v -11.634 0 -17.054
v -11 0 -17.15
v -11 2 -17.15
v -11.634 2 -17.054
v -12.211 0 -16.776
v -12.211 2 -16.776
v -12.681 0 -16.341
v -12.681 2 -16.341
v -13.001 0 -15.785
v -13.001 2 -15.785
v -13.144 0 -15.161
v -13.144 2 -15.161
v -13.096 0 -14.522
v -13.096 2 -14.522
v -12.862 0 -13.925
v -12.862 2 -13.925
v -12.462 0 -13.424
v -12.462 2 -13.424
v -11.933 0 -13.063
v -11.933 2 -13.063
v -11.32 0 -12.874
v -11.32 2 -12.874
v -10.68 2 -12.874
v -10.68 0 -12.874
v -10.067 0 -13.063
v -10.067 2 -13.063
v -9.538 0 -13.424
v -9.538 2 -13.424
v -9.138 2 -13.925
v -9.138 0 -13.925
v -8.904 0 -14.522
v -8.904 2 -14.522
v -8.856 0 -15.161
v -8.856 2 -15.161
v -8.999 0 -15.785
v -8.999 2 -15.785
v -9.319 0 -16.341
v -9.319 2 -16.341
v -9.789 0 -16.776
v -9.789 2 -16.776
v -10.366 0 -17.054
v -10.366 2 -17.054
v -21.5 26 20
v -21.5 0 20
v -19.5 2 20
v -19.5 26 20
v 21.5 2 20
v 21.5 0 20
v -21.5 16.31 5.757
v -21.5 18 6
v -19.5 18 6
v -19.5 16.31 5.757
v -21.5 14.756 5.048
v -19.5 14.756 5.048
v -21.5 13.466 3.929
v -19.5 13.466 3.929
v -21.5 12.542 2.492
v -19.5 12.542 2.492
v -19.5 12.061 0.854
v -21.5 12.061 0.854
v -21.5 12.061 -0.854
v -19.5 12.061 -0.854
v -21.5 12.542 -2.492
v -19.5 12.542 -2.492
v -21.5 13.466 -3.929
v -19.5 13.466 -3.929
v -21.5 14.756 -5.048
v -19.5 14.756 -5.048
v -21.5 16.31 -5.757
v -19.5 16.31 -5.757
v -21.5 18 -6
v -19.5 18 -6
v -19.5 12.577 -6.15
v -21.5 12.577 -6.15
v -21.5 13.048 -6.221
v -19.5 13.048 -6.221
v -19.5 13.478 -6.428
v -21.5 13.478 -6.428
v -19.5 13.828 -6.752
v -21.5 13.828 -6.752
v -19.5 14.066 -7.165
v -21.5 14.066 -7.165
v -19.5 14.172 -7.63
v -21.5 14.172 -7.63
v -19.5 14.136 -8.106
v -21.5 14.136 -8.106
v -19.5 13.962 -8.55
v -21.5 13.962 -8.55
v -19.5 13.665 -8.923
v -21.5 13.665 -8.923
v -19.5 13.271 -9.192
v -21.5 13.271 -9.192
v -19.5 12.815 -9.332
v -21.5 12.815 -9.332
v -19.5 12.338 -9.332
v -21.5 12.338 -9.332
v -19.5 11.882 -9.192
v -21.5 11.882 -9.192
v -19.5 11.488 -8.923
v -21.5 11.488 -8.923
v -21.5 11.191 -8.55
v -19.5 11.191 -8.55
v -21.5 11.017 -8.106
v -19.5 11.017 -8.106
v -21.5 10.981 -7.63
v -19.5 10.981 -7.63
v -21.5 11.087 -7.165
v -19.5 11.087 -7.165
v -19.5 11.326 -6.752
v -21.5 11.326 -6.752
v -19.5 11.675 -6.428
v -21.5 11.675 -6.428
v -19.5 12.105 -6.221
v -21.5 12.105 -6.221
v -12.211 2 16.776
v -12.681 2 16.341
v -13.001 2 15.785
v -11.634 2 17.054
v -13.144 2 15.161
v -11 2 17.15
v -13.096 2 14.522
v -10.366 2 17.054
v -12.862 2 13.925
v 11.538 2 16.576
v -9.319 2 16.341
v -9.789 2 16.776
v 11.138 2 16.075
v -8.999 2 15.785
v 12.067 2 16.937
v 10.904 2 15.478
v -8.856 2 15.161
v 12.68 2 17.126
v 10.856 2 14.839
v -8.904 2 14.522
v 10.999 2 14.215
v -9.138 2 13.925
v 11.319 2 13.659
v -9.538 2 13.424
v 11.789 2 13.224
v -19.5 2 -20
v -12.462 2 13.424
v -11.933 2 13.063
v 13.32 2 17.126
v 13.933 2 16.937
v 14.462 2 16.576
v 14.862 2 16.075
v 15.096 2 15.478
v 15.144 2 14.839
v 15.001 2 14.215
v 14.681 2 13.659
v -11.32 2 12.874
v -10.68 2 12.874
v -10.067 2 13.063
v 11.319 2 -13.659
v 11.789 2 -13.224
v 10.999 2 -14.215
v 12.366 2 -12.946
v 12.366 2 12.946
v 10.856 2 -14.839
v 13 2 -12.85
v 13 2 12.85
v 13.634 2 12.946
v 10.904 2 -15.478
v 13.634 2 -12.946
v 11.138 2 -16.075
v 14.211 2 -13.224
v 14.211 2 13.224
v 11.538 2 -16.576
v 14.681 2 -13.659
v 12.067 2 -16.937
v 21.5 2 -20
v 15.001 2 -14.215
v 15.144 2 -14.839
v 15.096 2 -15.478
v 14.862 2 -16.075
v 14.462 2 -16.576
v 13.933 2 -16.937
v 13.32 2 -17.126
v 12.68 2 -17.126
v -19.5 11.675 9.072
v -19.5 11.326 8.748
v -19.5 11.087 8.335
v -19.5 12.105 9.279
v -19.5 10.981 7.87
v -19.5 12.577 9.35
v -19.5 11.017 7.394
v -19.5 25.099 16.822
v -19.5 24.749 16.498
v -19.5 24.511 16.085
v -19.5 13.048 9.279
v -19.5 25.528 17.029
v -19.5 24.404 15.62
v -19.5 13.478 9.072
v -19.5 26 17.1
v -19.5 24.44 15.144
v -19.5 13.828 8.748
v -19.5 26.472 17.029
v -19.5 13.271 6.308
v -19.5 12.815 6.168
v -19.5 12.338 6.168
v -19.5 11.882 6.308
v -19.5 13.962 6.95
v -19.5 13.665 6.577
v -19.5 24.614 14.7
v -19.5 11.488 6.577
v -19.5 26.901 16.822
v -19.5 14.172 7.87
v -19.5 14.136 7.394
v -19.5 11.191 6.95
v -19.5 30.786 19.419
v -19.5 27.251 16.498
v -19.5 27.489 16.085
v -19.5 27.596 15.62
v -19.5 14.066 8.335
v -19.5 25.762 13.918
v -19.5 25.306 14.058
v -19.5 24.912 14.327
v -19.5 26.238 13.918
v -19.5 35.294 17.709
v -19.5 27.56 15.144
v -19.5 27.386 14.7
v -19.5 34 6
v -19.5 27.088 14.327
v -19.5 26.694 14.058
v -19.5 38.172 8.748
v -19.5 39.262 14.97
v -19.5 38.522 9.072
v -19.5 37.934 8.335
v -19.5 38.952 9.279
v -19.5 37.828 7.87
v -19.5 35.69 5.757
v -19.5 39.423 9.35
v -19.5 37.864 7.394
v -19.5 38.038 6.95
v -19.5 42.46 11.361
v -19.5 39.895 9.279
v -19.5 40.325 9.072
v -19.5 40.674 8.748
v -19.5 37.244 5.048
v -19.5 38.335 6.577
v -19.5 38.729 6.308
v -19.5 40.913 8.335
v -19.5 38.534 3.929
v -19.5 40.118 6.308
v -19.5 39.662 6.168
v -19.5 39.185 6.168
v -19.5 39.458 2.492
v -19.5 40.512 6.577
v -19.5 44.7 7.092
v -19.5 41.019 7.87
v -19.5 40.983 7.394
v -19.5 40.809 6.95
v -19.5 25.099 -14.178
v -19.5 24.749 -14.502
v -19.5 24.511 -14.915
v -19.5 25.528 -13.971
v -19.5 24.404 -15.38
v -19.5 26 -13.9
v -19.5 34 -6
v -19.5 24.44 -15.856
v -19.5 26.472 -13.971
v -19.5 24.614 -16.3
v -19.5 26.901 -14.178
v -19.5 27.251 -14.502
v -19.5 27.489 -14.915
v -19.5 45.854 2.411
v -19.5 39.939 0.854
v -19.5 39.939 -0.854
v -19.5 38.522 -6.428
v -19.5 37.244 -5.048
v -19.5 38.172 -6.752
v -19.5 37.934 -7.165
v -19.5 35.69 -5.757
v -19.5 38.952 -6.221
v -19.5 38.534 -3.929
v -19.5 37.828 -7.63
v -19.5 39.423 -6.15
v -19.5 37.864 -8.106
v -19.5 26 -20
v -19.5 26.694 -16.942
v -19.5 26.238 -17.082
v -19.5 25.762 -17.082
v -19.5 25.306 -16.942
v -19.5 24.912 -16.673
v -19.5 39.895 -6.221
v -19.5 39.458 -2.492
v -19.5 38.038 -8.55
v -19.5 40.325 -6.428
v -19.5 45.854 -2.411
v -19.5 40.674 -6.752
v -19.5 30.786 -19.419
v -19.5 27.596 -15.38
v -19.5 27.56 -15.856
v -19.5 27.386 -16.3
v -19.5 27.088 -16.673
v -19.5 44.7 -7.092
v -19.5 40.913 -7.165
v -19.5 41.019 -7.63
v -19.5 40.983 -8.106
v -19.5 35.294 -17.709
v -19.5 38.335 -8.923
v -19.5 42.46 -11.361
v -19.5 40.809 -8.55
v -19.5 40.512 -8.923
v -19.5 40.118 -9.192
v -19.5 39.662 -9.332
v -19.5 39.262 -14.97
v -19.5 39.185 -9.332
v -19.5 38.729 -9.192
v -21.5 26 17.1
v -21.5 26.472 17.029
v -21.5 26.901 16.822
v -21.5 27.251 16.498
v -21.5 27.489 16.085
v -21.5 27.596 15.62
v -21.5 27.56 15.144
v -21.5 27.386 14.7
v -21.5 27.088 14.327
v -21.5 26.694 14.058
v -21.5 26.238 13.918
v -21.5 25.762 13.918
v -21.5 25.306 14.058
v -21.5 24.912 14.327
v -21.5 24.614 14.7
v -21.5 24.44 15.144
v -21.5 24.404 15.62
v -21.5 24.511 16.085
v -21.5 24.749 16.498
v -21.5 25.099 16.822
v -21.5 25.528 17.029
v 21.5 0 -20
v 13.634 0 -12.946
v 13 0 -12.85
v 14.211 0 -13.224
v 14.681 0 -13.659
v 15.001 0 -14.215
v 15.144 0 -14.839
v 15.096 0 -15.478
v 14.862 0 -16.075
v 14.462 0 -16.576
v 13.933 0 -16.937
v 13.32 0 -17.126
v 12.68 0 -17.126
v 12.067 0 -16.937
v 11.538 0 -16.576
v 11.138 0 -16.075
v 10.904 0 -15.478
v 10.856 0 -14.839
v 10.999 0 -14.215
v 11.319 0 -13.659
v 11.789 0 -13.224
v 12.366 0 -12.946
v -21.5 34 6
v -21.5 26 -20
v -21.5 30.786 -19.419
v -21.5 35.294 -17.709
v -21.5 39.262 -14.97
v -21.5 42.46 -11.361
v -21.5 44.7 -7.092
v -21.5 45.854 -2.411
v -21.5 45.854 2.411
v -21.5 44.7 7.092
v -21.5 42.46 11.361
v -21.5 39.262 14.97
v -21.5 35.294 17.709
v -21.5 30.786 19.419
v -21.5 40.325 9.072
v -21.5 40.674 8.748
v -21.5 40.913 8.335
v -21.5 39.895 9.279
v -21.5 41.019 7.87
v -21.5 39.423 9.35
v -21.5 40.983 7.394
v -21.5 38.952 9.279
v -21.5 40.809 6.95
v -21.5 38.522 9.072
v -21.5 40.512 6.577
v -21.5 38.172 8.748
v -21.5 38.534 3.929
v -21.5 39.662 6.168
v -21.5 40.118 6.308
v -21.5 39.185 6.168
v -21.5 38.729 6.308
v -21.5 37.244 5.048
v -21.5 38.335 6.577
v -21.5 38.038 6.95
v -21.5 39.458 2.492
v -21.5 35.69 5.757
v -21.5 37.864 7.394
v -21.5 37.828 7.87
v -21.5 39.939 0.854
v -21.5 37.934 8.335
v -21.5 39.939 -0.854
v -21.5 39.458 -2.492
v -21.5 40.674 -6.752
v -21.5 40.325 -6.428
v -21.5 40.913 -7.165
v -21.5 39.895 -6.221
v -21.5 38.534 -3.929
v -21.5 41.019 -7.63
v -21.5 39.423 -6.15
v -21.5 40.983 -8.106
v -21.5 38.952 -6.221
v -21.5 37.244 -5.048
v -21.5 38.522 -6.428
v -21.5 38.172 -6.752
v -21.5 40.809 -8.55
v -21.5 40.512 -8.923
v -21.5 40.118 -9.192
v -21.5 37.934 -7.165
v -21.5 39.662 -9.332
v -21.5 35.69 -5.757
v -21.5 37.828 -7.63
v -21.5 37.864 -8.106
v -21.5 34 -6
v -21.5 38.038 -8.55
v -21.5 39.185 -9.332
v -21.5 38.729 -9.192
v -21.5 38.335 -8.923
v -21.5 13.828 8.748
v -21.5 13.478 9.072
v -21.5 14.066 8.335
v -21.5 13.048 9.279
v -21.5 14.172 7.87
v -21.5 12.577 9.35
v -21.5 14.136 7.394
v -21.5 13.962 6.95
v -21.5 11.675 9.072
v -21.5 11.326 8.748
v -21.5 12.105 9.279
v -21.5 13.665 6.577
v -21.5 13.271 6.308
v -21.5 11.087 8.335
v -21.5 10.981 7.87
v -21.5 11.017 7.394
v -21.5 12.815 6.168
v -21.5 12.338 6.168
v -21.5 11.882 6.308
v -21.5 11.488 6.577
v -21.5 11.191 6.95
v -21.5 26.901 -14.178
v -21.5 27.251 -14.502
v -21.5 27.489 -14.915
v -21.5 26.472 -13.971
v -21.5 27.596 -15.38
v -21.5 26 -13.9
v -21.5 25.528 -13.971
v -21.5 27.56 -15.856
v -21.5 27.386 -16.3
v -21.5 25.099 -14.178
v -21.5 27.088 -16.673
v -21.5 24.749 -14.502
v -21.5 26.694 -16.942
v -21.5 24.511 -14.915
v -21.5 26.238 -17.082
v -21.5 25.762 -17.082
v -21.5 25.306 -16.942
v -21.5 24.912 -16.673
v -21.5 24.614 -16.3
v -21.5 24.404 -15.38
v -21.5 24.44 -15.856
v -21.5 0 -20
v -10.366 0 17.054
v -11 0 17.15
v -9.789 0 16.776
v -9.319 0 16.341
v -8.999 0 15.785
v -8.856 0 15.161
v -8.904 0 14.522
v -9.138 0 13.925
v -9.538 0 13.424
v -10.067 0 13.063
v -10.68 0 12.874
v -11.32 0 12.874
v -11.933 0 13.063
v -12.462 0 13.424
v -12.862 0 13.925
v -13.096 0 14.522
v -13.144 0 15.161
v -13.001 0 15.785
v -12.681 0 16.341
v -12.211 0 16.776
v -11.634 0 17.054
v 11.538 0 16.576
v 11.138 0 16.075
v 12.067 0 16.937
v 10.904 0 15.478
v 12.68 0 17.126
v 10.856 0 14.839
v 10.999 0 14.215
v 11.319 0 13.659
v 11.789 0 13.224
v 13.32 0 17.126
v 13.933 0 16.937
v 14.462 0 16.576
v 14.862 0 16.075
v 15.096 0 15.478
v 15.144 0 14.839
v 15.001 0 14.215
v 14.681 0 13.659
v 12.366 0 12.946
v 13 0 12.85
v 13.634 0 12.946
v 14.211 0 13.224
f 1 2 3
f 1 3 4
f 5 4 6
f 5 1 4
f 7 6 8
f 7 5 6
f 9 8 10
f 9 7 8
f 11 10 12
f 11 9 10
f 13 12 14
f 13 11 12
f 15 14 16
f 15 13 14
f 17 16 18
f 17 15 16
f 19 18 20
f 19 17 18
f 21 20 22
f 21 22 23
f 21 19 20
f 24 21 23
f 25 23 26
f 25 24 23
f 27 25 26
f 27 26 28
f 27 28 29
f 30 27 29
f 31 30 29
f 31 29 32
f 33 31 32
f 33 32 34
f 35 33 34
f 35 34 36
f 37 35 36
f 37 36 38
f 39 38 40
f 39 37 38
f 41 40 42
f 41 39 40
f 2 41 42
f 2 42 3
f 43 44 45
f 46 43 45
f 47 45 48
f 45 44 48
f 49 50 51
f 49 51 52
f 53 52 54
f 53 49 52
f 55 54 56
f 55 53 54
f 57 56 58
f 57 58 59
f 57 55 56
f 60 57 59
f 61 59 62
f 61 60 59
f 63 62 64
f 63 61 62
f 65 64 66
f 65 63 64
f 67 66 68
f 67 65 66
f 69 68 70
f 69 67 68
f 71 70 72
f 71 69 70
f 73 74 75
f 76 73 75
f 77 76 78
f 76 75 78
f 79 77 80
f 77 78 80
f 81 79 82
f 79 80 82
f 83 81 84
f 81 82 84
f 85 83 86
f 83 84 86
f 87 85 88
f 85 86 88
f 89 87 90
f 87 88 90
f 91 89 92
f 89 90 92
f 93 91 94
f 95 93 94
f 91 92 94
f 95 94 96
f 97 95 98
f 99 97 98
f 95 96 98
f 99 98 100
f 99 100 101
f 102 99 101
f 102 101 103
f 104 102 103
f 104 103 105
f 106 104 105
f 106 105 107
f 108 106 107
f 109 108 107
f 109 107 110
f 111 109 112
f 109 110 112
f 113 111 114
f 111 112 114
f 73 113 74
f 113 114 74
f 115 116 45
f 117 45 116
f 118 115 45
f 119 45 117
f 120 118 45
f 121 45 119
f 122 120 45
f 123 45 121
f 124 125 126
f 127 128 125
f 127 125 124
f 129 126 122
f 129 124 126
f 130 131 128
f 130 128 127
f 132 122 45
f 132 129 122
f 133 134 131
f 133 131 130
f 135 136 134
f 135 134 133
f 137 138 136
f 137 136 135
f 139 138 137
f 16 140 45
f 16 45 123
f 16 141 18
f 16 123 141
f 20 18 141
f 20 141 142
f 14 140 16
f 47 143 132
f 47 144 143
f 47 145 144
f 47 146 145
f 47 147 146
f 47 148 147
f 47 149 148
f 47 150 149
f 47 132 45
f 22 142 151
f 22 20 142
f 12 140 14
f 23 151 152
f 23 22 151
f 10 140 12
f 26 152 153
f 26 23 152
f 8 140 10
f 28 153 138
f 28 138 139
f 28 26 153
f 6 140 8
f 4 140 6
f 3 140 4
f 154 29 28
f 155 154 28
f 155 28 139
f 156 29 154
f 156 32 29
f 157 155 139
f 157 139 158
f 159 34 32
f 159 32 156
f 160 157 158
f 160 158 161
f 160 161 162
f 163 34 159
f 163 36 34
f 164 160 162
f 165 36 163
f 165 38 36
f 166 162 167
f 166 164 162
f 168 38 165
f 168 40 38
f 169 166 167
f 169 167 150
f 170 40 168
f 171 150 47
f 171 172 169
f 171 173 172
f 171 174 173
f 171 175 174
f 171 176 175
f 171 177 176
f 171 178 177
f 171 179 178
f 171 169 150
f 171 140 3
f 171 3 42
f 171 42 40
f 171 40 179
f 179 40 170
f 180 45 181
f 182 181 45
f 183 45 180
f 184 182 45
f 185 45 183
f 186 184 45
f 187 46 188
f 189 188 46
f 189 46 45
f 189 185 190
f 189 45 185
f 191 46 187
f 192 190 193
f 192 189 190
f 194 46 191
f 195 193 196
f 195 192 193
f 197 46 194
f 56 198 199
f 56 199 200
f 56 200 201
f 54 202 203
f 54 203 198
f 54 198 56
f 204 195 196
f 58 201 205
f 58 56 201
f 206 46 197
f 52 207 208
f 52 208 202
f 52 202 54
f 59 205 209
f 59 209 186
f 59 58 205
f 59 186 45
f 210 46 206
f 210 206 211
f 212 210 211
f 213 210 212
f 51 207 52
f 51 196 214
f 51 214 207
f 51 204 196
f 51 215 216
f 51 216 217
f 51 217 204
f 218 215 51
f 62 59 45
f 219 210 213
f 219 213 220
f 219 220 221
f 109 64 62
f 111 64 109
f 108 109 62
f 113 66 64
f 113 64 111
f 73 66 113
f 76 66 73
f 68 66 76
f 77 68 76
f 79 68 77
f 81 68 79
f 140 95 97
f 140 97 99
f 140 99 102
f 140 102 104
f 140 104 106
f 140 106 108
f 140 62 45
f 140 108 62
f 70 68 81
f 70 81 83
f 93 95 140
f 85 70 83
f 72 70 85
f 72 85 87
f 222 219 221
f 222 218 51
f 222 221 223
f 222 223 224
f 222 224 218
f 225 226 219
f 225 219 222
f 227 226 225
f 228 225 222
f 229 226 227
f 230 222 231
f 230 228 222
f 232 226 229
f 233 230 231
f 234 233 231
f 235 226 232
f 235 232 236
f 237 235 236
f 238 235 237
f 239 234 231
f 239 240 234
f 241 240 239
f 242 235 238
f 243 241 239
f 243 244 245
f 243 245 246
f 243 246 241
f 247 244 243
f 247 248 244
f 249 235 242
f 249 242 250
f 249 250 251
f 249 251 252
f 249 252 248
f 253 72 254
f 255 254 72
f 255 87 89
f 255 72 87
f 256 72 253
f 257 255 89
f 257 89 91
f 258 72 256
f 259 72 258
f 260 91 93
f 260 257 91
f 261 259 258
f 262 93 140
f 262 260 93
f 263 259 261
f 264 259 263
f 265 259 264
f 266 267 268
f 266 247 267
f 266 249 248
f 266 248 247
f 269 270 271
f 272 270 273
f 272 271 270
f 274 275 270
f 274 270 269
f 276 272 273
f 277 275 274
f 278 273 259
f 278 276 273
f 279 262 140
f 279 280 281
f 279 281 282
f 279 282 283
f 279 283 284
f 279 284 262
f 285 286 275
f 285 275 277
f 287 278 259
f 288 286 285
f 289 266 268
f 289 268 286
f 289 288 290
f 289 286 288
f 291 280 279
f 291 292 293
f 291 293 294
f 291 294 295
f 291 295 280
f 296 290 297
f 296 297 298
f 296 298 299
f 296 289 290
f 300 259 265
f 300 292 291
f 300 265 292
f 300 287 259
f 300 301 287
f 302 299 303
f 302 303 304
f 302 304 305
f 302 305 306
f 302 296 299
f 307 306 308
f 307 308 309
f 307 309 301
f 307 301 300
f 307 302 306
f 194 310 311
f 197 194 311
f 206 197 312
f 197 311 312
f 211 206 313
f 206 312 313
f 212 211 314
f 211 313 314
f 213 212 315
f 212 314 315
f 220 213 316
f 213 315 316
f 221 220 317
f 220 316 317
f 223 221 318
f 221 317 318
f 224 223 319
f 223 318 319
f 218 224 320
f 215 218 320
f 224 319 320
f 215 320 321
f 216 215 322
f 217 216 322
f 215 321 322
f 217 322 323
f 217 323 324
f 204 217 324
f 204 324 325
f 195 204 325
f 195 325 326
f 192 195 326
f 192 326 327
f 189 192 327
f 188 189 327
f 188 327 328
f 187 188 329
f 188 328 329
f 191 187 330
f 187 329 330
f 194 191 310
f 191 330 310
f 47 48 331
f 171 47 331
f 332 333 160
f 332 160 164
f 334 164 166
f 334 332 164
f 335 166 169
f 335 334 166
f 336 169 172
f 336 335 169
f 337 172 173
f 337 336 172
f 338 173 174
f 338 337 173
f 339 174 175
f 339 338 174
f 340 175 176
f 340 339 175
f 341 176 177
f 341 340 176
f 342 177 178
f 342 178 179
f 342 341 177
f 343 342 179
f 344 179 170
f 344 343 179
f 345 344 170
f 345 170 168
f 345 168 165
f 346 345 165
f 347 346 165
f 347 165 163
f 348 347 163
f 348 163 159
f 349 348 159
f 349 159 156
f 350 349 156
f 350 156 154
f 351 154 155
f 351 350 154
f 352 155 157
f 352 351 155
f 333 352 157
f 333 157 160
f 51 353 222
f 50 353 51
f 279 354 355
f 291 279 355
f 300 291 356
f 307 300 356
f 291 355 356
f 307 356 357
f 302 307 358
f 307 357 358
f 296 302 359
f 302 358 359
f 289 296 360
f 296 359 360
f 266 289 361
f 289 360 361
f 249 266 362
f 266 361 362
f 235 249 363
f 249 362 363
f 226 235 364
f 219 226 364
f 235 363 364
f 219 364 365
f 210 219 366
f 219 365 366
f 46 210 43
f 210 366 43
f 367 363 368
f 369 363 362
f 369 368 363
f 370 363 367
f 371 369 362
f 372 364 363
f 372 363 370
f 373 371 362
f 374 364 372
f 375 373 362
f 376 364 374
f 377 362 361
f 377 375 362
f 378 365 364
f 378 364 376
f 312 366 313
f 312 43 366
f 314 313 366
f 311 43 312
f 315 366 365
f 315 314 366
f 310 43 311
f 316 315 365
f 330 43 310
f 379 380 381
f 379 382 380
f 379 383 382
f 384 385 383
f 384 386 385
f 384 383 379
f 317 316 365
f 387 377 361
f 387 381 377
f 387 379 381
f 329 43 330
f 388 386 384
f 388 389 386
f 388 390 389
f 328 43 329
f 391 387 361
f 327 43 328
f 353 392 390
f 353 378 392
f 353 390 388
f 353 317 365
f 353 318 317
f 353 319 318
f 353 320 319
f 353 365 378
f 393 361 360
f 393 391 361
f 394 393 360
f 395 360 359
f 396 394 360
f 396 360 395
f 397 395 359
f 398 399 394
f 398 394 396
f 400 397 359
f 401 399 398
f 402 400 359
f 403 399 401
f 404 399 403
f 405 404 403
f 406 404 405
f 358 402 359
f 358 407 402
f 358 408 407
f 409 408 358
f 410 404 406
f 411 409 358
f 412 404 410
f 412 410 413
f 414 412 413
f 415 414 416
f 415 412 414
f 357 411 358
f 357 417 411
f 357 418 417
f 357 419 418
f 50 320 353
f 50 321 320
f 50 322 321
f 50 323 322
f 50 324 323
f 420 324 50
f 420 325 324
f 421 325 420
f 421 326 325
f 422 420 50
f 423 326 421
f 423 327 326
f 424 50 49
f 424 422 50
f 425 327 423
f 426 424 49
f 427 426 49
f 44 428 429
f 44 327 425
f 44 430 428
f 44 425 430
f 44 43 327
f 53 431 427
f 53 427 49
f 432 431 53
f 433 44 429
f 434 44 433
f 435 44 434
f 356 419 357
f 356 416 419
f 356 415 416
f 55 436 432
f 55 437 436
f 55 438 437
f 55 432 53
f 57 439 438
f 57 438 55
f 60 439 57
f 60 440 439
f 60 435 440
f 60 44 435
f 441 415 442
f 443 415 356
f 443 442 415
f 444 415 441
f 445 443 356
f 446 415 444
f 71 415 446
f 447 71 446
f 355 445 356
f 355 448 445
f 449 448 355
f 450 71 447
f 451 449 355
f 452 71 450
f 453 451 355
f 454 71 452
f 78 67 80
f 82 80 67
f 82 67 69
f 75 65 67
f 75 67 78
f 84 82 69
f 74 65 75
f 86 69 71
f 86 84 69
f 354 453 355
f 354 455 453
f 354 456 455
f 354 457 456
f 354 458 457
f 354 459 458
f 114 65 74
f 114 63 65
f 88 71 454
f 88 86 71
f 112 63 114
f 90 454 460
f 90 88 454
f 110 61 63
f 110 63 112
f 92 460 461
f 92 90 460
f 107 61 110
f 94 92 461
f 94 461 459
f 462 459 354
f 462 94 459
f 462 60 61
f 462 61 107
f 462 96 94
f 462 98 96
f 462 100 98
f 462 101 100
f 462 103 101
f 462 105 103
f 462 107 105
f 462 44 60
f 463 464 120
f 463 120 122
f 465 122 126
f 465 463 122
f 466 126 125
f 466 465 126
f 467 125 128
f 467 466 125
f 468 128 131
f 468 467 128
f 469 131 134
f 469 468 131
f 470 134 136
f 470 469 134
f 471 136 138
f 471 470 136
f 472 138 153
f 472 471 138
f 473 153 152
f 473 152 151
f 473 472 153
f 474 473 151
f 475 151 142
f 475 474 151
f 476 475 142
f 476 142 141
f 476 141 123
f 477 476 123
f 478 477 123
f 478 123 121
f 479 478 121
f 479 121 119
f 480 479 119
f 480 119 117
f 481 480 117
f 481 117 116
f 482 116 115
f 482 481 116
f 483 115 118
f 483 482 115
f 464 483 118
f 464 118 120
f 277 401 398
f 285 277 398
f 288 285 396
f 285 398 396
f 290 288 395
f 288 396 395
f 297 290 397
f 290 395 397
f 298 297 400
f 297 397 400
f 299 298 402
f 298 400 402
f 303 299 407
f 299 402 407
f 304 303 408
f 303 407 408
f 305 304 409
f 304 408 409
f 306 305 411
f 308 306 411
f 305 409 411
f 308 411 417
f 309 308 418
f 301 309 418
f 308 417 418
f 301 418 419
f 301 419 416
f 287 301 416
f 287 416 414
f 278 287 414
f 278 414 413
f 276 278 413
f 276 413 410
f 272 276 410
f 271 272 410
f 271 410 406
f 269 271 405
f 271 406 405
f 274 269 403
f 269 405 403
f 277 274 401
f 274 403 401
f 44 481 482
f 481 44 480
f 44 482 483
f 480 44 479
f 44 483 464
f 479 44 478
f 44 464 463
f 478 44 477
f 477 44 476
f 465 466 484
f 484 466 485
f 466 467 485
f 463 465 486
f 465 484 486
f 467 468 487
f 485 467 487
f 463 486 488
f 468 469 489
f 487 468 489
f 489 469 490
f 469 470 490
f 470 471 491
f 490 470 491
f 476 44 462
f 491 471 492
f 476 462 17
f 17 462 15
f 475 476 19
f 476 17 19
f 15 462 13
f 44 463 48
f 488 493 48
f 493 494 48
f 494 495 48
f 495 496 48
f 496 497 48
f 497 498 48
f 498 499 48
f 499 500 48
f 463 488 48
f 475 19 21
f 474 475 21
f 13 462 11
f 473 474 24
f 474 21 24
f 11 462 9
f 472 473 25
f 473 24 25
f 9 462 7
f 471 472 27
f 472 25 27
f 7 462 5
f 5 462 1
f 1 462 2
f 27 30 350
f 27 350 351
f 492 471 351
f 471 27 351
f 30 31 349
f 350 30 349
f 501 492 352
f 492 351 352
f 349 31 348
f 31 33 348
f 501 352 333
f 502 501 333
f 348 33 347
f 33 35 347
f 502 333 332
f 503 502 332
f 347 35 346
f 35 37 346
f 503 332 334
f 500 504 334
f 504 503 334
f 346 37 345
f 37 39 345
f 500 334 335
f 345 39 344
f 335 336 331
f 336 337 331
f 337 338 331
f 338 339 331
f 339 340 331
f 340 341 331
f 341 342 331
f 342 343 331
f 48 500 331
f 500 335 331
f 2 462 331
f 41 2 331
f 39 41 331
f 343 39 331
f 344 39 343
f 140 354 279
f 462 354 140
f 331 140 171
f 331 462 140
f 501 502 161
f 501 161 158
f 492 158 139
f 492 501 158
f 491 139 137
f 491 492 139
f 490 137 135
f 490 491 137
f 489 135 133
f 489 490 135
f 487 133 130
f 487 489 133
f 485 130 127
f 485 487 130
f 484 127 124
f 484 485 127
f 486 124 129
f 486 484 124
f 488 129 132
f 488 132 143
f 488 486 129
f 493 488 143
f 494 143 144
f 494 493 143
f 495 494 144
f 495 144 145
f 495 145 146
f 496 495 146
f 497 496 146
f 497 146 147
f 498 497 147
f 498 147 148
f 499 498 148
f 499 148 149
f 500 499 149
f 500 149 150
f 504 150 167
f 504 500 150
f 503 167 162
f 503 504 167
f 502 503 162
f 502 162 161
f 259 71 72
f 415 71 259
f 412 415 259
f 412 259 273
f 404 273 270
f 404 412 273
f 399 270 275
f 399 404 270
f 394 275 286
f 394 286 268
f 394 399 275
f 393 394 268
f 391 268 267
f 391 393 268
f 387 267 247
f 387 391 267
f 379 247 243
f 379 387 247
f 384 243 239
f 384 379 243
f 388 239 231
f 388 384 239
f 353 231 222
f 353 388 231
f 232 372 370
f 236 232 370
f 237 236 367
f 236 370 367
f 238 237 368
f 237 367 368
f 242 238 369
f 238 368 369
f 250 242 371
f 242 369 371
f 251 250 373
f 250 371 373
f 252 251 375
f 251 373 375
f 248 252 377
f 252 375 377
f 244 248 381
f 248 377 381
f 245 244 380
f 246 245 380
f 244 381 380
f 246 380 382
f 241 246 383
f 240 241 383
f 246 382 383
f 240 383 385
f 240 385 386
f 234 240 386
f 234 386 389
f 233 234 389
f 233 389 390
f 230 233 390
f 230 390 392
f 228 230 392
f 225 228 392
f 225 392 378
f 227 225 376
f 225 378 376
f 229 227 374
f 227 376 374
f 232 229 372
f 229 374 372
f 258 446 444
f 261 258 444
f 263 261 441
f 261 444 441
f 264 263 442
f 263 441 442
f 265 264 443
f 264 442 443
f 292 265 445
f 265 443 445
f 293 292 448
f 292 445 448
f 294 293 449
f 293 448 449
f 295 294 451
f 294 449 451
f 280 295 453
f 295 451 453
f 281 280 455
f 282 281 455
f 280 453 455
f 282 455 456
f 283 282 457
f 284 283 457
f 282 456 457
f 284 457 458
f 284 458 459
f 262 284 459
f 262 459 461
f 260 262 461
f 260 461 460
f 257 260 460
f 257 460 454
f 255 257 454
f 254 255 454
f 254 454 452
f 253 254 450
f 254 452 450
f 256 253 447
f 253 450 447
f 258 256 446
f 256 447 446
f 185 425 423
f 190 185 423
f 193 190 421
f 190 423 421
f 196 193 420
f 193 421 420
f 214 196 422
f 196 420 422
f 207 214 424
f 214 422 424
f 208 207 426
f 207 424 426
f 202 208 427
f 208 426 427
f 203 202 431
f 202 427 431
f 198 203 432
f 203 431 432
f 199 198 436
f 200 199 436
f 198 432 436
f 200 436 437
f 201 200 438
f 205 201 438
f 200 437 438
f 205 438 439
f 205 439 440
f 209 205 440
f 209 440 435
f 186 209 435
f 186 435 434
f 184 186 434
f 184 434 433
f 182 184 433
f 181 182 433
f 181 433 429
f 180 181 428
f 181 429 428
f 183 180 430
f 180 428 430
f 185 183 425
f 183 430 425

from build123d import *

# Parameters (mm, degrees)
SKETCH_1_W      = 43
SKETCH_1_H      = 40
SKETCH_1_R      = 2.15
EXTRUDE_1_DEPTH = 2
SKETCH_3_R      = 1.6
EXTRUDE_2_DEPTH = 2


with BuildPart() as part:
    # 草图1 → 凸台-拉伸1 (new body)
    with BuildSketch(Plane(origin=(0, 0, 0), x_dir=(1, 0, 0), z_dir=(0, 1, 0))):
        Rectangle(SKETCH_1_W, SKETCH_1_H)
        with Locations(Location((13, 15, 0), (0, 0, 270))):
            Circle(SKETCH_1_R, mode=Mode.SUBTRACT)
        with Locations(Location((13, -15, 0), (0, 0, 90))):
            Circle(SKETCH_1_R, mode=Mode.SUBTRACT)
        with Locations(Location((-11, 15, 0), (0, 0, 90))):
            Circle(SKETCH_1_R, mode=Mode.SUBTRACT)
        with Locations(Location((-11, -15, 0), (0, 0, 270))):
            Circle(SKETCH_1_R, mode=Mode.SUBTRACT)
    extrude(amount=EXTRUDE_1_DEPTH)

    # 草图3 → 凸台-拉伸2 (add)
    with BuildSketch(Plane.ZY.offset(21.5)):
        with BuildLine():
            Line((-20, 0), (-20, 26))
            ThreePointArc((-20, 26), (0, 46), (20, 26))
            Line((20, 26), (20, 0))
            Line((20, 0), (-20, 0))
        make_face()
        with Locations((-15.5, 26)):
            Circle(SKETCH_3_R, mode=Mode.SUBTRACT)
        with Locations((-7.75, 39.423393759)):
            Circle(SKETCH_3_R, mode=Mode.SUBTRACT)
        with Locations((7.75, 39.423393759)):
            Circle(SKETCH_3_R, mode=Mode.SUBTRACT)
        with Locations((15.5, 26)):
            Circle(SKETCH_3_R, mode=Mode.SUBTRACT)
        with Locations((7.75, 12.576606241)):
            Circle(SKETCH_3_R, mode=Mode.SUBTRACT)
        with Locations((-7.75, 12.576606241)):
            Circle(SKETCH_3_R, mode=Mode.SUBTRACT)
        with BuildLine():
            Line((-6, 18), (-6, 34))
            ThreePointArc((-6, 34), (0, 40), (6, 34))
            Line((6, 34), (6, 18))
            ThreePointArc((6, 18), (0, 12), (-6, 18))
        make_face(mode=Mode.SUBTRACT)
    extrude(amount=-EXTRUDE_2_DEPTH)


solid = part.part
